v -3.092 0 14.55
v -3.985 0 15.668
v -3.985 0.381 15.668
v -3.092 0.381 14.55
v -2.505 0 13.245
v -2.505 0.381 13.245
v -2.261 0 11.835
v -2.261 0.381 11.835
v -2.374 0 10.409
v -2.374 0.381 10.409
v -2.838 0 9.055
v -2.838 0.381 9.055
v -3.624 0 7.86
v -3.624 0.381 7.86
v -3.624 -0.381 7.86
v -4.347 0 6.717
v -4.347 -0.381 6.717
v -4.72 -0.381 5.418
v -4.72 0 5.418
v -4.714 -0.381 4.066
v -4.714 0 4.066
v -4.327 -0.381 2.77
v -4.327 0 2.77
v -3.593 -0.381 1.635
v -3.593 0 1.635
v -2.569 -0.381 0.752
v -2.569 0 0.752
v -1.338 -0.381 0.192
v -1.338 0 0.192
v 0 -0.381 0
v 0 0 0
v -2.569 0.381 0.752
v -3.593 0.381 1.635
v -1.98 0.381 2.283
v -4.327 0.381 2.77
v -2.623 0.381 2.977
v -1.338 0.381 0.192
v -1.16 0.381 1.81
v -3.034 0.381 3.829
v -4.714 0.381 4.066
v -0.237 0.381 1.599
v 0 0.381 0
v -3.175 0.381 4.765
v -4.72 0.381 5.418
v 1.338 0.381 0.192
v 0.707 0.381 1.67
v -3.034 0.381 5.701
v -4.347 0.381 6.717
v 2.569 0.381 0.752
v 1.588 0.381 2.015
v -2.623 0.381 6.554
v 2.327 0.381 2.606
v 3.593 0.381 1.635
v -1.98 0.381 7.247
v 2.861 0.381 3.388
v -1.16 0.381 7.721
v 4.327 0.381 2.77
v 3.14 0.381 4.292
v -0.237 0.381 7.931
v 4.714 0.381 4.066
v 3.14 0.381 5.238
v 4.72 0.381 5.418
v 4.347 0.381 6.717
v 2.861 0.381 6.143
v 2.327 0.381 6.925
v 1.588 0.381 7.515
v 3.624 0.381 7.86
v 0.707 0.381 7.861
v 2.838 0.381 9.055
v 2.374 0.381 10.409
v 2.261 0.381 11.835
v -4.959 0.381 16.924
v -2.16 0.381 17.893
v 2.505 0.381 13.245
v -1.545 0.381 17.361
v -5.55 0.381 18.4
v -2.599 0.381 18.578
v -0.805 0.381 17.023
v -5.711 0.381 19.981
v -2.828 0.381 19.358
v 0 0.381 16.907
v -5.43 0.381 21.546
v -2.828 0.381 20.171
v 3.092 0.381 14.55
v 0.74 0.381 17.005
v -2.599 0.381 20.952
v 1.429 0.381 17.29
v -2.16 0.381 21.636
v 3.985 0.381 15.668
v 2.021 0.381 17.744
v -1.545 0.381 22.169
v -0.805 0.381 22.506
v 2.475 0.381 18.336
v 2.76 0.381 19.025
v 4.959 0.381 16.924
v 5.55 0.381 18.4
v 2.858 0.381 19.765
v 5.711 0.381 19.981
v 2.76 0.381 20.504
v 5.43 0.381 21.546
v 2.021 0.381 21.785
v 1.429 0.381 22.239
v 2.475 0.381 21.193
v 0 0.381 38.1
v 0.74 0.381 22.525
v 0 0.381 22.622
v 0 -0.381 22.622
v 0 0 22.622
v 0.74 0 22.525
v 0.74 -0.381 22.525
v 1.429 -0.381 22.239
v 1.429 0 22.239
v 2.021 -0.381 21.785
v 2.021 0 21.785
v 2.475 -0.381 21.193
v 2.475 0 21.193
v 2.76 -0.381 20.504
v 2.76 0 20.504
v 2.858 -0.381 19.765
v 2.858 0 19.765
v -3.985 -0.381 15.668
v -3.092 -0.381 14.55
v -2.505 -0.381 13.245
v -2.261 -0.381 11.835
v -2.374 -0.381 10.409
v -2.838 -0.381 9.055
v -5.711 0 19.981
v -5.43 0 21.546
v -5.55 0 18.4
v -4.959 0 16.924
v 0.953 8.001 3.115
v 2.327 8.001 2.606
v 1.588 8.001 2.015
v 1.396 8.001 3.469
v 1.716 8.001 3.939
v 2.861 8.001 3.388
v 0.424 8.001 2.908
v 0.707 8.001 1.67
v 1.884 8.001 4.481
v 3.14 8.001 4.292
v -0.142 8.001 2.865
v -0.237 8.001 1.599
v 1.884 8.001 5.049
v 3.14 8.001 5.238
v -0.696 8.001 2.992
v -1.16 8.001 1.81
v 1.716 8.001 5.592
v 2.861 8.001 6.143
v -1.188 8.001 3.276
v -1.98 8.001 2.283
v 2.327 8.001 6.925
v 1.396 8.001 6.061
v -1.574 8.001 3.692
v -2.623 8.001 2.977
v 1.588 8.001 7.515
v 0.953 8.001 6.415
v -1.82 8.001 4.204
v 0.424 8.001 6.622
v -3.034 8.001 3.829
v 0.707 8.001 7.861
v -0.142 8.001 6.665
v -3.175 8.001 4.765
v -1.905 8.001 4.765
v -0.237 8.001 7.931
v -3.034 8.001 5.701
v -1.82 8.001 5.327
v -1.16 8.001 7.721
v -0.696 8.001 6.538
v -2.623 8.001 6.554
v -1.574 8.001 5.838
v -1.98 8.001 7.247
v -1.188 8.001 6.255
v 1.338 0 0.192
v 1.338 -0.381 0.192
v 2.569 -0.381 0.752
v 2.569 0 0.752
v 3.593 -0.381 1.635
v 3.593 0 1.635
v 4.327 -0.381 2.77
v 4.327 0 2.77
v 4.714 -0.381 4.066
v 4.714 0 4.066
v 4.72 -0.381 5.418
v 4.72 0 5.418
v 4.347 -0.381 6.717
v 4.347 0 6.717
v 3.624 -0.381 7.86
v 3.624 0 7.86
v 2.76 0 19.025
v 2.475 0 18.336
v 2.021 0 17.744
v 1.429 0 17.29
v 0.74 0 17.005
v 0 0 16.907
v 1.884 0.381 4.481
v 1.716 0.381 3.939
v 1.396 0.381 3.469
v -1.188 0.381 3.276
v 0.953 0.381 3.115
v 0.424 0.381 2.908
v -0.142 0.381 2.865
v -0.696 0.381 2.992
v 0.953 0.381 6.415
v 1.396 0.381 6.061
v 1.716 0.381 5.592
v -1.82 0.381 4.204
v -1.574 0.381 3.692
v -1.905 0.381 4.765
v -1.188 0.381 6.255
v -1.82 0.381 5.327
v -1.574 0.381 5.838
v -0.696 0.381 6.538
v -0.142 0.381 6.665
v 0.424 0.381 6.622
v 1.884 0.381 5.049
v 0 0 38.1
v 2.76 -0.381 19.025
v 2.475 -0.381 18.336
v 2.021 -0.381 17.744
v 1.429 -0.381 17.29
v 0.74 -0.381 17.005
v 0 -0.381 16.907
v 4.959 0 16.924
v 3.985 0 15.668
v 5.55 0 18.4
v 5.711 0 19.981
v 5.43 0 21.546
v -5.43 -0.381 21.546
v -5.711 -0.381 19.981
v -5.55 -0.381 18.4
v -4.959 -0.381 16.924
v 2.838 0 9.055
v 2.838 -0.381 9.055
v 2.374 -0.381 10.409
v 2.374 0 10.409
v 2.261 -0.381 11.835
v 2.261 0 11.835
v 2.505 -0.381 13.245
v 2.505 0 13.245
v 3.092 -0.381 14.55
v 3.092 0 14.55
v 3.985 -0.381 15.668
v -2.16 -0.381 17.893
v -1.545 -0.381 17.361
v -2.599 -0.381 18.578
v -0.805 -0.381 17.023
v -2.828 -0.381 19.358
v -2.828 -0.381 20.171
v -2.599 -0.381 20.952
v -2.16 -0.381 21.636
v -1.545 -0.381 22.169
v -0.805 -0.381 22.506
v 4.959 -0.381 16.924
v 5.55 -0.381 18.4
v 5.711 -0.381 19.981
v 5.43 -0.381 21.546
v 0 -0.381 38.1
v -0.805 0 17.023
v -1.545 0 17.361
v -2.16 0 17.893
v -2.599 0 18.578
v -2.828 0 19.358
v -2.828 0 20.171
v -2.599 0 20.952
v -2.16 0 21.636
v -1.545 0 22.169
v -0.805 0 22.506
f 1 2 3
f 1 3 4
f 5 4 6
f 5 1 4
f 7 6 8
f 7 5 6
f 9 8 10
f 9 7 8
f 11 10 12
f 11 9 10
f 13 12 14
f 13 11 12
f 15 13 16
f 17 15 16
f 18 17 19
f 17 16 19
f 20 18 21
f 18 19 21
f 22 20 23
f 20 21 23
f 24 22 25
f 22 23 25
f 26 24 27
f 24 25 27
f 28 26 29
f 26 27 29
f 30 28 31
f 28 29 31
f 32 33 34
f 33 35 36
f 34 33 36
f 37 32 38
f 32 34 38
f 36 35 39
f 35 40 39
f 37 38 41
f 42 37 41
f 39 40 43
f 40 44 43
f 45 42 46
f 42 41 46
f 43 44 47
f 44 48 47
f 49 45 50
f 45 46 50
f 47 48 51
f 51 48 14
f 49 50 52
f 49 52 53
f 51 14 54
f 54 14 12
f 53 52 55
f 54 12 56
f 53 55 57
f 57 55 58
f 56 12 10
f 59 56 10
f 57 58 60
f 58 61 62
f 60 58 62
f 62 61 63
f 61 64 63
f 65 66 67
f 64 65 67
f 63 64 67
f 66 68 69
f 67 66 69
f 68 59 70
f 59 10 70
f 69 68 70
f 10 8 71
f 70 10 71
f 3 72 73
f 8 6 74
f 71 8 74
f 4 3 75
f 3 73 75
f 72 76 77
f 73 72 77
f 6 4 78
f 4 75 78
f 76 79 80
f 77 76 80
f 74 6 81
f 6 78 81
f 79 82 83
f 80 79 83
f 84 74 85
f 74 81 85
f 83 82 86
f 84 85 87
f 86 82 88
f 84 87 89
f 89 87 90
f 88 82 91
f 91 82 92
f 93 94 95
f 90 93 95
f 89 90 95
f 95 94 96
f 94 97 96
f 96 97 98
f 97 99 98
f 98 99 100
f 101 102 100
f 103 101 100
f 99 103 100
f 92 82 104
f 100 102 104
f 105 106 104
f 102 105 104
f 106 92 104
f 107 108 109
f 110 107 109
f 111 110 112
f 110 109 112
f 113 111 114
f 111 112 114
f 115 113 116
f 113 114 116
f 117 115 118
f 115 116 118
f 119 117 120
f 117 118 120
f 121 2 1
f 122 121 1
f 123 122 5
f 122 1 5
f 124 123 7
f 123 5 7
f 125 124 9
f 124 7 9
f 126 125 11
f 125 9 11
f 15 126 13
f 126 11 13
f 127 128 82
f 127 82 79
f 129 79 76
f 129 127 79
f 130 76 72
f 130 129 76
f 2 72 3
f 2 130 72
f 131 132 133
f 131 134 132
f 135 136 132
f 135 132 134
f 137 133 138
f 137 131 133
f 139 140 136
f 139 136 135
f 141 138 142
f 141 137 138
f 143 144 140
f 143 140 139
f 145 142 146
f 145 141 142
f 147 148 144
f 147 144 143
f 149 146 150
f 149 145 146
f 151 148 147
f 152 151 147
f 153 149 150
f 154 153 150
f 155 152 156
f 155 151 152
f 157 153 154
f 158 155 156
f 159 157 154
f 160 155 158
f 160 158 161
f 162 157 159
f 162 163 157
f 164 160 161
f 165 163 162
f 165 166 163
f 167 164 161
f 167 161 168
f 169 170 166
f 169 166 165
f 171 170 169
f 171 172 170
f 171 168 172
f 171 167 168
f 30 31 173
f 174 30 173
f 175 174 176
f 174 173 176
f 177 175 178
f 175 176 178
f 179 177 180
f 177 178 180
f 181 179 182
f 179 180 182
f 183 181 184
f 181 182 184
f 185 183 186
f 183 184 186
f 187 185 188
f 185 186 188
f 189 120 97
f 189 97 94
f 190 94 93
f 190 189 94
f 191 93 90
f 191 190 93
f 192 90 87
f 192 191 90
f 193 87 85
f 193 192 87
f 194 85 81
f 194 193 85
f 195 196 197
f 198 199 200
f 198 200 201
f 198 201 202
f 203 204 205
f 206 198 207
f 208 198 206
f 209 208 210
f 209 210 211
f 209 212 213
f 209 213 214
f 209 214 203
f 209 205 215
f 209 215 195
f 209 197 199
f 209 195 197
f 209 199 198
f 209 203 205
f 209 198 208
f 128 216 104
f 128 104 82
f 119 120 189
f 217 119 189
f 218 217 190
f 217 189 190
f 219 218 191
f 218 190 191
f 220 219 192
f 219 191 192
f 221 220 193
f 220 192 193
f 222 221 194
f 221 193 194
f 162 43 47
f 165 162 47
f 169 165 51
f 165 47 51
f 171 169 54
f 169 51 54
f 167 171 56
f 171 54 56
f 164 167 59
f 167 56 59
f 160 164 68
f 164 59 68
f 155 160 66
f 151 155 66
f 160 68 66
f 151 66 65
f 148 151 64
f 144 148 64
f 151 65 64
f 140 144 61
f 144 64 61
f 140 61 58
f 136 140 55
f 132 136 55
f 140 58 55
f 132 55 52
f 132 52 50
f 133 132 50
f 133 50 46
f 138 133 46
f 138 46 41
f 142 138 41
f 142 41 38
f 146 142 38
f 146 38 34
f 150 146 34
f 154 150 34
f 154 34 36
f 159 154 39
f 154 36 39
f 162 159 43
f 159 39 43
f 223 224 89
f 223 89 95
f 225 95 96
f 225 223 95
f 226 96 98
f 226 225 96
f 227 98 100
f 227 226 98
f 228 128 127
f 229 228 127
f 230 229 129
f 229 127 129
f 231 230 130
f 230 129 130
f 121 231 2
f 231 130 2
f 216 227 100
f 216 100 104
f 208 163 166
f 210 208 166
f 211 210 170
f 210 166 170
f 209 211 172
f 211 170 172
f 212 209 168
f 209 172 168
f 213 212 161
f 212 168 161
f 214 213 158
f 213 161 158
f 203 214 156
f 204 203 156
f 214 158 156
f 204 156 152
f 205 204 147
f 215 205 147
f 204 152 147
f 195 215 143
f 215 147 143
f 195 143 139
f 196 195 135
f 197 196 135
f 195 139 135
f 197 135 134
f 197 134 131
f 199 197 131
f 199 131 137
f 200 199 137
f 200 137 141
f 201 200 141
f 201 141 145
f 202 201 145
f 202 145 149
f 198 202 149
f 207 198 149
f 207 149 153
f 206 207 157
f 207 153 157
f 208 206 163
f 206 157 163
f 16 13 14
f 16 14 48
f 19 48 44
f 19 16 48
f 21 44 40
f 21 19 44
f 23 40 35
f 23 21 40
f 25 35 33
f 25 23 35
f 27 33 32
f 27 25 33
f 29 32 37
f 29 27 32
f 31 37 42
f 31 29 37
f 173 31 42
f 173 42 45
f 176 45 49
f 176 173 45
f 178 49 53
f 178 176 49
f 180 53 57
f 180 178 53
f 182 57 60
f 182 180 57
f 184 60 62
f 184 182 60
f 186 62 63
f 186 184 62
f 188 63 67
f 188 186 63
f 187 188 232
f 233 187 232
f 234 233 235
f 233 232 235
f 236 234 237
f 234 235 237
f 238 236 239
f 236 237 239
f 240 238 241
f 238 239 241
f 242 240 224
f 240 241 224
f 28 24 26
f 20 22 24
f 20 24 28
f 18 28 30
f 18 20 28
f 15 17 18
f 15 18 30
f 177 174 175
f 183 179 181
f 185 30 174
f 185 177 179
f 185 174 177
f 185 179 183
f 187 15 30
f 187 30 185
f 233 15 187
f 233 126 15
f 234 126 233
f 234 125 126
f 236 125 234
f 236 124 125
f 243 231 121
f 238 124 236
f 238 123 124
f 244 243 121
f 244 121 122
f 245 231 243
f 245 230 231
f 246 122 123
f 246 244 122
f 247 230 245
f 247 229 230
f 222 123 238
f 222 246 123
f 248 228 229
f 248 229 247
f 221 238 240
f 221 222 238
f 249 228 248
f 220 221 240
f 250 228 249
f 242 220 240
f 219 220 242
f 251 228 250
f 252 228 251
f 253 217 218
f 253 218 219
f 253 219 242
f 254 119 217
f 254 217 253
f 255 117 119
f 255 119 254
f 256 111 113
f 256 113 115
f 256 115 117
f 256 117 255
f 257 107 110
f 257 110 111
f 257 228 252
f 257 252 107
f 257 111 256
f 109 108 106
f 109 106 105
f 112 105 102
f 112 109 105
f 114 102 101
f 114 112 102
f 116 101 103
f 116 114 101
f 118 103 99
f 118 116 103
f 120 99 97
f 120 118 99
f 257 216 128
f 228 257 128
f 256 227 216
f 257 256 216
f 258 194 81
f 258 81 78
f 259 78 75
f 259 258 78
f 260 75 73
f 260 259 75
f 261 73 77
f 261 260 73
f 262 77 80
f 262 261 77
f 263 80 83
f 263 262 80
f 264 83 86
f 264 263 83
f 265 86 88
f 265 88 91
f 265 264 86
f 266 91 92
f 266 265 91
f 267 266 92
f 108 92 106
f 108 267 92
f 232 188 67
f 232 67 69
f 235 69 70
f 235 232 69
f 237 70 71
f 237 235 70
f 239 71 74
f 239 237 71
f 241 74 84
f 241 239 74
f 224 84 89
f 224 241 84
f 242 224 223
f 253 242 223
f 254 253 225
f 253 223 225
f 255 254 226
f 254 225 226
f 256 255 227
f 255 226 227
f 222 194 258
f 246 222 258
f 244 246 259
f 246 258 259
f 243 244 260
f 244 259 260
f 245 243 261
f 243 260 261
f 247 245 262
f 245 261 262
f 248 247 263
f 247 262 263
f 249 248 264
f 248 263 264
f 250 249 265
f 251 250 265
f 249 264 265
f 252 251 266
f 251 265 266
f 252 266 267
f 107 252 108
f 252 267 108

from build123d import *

# Parameters (mm, degrees)
F1_DEPTH = 0.381
F2_R     = 3.175
F3_DEPTH = 7.62
F4_R     = 1.905
F5_DEPTH = 7.62


with BuildPart() as f1:
    # F0 (on Front) → F1 (new body, symmetric)
    with BuildSketch(Plane.XZ):
        with BuildLine():
            Line((0, 16.9071391262), (0, 0))
            ThreePointArc((0, 0), (4.3273821072, 2.7700813861), (3.623545871, 7.8596983992))
            ThreePointArc((3.623545871, 7.8596983992), (2.2605059715, 11.8351901014), (3.9847012446, 15.6678866329))
            ThreePointArc((3.9847012446, 15.6678866329), (5.5496385017, 18.3998177093), (5.4302954357, 21.5459634876))
            Line((5.4302954357, 21.5459634876), (0, 38.1))
            Line((0, 38.1), (0, 22.6221391262))
            ThreePointArc((0, 22.6221391262), (2.0205576272, 21.7851967534), (2.8575, 19.7646391262))
            ThreePointArc((2.8575, 19.7646391262), (2.0205576272, 17.744081499), (0, 16.9071391262))
        make_face()
        with BuildLine():
            ThreePointArc((-3.623545871, 7.8596983992), (-4.3273821072, 2.7700813861), (0, 0))
            Line((0, 0), (0, 16.9071391262))
            ThreePointArc((0, 16.9071391262), (-2.8575, 19.7646391262), (0, 22.6221391262))
            Line((0, 22.6221391262), (0, 38.1))
            Line((0, 38.1), (-5.4302954357, 21.5459634876))
            ThreePointArc((-5.4302954357, 21.5459634876), (-5.5496385017, 18.3998177093), (-3.9847012446, 15.6678866329))
            ThreePointArc((-3.9847012446, 15.6678866329), (-2.2605059715, 11.8351901014), (-3.623545871, 7.8596983992))
        make_face()
    extrude(amount=F1_DEPTH, both=True)

    # F2 (on face) → F3 (join)
    with BuildSketch(Plane(origin=(0, 0.381, 0), x_dir=(-1, 0, 0), z_dir=(0, 1, 0))):
        with Locations((0, 4.7651283676)):
            Circle(F2_R)
    extrude(amount=F3_DEPTH)

    # F4 (on face) → F5 (cut)
    with BuildSketch(Plane(origin=(0, 8.001, 0), x_dir=(-1, 0, 0), z_dir=(0, 1, 0))):
        with Locations((0, 4.7651283676)):
            Circle(F4_R)
    extrude(amount=-F5_DEPTH, mode=Mode.SUBTRACT)


solid = f1.part
